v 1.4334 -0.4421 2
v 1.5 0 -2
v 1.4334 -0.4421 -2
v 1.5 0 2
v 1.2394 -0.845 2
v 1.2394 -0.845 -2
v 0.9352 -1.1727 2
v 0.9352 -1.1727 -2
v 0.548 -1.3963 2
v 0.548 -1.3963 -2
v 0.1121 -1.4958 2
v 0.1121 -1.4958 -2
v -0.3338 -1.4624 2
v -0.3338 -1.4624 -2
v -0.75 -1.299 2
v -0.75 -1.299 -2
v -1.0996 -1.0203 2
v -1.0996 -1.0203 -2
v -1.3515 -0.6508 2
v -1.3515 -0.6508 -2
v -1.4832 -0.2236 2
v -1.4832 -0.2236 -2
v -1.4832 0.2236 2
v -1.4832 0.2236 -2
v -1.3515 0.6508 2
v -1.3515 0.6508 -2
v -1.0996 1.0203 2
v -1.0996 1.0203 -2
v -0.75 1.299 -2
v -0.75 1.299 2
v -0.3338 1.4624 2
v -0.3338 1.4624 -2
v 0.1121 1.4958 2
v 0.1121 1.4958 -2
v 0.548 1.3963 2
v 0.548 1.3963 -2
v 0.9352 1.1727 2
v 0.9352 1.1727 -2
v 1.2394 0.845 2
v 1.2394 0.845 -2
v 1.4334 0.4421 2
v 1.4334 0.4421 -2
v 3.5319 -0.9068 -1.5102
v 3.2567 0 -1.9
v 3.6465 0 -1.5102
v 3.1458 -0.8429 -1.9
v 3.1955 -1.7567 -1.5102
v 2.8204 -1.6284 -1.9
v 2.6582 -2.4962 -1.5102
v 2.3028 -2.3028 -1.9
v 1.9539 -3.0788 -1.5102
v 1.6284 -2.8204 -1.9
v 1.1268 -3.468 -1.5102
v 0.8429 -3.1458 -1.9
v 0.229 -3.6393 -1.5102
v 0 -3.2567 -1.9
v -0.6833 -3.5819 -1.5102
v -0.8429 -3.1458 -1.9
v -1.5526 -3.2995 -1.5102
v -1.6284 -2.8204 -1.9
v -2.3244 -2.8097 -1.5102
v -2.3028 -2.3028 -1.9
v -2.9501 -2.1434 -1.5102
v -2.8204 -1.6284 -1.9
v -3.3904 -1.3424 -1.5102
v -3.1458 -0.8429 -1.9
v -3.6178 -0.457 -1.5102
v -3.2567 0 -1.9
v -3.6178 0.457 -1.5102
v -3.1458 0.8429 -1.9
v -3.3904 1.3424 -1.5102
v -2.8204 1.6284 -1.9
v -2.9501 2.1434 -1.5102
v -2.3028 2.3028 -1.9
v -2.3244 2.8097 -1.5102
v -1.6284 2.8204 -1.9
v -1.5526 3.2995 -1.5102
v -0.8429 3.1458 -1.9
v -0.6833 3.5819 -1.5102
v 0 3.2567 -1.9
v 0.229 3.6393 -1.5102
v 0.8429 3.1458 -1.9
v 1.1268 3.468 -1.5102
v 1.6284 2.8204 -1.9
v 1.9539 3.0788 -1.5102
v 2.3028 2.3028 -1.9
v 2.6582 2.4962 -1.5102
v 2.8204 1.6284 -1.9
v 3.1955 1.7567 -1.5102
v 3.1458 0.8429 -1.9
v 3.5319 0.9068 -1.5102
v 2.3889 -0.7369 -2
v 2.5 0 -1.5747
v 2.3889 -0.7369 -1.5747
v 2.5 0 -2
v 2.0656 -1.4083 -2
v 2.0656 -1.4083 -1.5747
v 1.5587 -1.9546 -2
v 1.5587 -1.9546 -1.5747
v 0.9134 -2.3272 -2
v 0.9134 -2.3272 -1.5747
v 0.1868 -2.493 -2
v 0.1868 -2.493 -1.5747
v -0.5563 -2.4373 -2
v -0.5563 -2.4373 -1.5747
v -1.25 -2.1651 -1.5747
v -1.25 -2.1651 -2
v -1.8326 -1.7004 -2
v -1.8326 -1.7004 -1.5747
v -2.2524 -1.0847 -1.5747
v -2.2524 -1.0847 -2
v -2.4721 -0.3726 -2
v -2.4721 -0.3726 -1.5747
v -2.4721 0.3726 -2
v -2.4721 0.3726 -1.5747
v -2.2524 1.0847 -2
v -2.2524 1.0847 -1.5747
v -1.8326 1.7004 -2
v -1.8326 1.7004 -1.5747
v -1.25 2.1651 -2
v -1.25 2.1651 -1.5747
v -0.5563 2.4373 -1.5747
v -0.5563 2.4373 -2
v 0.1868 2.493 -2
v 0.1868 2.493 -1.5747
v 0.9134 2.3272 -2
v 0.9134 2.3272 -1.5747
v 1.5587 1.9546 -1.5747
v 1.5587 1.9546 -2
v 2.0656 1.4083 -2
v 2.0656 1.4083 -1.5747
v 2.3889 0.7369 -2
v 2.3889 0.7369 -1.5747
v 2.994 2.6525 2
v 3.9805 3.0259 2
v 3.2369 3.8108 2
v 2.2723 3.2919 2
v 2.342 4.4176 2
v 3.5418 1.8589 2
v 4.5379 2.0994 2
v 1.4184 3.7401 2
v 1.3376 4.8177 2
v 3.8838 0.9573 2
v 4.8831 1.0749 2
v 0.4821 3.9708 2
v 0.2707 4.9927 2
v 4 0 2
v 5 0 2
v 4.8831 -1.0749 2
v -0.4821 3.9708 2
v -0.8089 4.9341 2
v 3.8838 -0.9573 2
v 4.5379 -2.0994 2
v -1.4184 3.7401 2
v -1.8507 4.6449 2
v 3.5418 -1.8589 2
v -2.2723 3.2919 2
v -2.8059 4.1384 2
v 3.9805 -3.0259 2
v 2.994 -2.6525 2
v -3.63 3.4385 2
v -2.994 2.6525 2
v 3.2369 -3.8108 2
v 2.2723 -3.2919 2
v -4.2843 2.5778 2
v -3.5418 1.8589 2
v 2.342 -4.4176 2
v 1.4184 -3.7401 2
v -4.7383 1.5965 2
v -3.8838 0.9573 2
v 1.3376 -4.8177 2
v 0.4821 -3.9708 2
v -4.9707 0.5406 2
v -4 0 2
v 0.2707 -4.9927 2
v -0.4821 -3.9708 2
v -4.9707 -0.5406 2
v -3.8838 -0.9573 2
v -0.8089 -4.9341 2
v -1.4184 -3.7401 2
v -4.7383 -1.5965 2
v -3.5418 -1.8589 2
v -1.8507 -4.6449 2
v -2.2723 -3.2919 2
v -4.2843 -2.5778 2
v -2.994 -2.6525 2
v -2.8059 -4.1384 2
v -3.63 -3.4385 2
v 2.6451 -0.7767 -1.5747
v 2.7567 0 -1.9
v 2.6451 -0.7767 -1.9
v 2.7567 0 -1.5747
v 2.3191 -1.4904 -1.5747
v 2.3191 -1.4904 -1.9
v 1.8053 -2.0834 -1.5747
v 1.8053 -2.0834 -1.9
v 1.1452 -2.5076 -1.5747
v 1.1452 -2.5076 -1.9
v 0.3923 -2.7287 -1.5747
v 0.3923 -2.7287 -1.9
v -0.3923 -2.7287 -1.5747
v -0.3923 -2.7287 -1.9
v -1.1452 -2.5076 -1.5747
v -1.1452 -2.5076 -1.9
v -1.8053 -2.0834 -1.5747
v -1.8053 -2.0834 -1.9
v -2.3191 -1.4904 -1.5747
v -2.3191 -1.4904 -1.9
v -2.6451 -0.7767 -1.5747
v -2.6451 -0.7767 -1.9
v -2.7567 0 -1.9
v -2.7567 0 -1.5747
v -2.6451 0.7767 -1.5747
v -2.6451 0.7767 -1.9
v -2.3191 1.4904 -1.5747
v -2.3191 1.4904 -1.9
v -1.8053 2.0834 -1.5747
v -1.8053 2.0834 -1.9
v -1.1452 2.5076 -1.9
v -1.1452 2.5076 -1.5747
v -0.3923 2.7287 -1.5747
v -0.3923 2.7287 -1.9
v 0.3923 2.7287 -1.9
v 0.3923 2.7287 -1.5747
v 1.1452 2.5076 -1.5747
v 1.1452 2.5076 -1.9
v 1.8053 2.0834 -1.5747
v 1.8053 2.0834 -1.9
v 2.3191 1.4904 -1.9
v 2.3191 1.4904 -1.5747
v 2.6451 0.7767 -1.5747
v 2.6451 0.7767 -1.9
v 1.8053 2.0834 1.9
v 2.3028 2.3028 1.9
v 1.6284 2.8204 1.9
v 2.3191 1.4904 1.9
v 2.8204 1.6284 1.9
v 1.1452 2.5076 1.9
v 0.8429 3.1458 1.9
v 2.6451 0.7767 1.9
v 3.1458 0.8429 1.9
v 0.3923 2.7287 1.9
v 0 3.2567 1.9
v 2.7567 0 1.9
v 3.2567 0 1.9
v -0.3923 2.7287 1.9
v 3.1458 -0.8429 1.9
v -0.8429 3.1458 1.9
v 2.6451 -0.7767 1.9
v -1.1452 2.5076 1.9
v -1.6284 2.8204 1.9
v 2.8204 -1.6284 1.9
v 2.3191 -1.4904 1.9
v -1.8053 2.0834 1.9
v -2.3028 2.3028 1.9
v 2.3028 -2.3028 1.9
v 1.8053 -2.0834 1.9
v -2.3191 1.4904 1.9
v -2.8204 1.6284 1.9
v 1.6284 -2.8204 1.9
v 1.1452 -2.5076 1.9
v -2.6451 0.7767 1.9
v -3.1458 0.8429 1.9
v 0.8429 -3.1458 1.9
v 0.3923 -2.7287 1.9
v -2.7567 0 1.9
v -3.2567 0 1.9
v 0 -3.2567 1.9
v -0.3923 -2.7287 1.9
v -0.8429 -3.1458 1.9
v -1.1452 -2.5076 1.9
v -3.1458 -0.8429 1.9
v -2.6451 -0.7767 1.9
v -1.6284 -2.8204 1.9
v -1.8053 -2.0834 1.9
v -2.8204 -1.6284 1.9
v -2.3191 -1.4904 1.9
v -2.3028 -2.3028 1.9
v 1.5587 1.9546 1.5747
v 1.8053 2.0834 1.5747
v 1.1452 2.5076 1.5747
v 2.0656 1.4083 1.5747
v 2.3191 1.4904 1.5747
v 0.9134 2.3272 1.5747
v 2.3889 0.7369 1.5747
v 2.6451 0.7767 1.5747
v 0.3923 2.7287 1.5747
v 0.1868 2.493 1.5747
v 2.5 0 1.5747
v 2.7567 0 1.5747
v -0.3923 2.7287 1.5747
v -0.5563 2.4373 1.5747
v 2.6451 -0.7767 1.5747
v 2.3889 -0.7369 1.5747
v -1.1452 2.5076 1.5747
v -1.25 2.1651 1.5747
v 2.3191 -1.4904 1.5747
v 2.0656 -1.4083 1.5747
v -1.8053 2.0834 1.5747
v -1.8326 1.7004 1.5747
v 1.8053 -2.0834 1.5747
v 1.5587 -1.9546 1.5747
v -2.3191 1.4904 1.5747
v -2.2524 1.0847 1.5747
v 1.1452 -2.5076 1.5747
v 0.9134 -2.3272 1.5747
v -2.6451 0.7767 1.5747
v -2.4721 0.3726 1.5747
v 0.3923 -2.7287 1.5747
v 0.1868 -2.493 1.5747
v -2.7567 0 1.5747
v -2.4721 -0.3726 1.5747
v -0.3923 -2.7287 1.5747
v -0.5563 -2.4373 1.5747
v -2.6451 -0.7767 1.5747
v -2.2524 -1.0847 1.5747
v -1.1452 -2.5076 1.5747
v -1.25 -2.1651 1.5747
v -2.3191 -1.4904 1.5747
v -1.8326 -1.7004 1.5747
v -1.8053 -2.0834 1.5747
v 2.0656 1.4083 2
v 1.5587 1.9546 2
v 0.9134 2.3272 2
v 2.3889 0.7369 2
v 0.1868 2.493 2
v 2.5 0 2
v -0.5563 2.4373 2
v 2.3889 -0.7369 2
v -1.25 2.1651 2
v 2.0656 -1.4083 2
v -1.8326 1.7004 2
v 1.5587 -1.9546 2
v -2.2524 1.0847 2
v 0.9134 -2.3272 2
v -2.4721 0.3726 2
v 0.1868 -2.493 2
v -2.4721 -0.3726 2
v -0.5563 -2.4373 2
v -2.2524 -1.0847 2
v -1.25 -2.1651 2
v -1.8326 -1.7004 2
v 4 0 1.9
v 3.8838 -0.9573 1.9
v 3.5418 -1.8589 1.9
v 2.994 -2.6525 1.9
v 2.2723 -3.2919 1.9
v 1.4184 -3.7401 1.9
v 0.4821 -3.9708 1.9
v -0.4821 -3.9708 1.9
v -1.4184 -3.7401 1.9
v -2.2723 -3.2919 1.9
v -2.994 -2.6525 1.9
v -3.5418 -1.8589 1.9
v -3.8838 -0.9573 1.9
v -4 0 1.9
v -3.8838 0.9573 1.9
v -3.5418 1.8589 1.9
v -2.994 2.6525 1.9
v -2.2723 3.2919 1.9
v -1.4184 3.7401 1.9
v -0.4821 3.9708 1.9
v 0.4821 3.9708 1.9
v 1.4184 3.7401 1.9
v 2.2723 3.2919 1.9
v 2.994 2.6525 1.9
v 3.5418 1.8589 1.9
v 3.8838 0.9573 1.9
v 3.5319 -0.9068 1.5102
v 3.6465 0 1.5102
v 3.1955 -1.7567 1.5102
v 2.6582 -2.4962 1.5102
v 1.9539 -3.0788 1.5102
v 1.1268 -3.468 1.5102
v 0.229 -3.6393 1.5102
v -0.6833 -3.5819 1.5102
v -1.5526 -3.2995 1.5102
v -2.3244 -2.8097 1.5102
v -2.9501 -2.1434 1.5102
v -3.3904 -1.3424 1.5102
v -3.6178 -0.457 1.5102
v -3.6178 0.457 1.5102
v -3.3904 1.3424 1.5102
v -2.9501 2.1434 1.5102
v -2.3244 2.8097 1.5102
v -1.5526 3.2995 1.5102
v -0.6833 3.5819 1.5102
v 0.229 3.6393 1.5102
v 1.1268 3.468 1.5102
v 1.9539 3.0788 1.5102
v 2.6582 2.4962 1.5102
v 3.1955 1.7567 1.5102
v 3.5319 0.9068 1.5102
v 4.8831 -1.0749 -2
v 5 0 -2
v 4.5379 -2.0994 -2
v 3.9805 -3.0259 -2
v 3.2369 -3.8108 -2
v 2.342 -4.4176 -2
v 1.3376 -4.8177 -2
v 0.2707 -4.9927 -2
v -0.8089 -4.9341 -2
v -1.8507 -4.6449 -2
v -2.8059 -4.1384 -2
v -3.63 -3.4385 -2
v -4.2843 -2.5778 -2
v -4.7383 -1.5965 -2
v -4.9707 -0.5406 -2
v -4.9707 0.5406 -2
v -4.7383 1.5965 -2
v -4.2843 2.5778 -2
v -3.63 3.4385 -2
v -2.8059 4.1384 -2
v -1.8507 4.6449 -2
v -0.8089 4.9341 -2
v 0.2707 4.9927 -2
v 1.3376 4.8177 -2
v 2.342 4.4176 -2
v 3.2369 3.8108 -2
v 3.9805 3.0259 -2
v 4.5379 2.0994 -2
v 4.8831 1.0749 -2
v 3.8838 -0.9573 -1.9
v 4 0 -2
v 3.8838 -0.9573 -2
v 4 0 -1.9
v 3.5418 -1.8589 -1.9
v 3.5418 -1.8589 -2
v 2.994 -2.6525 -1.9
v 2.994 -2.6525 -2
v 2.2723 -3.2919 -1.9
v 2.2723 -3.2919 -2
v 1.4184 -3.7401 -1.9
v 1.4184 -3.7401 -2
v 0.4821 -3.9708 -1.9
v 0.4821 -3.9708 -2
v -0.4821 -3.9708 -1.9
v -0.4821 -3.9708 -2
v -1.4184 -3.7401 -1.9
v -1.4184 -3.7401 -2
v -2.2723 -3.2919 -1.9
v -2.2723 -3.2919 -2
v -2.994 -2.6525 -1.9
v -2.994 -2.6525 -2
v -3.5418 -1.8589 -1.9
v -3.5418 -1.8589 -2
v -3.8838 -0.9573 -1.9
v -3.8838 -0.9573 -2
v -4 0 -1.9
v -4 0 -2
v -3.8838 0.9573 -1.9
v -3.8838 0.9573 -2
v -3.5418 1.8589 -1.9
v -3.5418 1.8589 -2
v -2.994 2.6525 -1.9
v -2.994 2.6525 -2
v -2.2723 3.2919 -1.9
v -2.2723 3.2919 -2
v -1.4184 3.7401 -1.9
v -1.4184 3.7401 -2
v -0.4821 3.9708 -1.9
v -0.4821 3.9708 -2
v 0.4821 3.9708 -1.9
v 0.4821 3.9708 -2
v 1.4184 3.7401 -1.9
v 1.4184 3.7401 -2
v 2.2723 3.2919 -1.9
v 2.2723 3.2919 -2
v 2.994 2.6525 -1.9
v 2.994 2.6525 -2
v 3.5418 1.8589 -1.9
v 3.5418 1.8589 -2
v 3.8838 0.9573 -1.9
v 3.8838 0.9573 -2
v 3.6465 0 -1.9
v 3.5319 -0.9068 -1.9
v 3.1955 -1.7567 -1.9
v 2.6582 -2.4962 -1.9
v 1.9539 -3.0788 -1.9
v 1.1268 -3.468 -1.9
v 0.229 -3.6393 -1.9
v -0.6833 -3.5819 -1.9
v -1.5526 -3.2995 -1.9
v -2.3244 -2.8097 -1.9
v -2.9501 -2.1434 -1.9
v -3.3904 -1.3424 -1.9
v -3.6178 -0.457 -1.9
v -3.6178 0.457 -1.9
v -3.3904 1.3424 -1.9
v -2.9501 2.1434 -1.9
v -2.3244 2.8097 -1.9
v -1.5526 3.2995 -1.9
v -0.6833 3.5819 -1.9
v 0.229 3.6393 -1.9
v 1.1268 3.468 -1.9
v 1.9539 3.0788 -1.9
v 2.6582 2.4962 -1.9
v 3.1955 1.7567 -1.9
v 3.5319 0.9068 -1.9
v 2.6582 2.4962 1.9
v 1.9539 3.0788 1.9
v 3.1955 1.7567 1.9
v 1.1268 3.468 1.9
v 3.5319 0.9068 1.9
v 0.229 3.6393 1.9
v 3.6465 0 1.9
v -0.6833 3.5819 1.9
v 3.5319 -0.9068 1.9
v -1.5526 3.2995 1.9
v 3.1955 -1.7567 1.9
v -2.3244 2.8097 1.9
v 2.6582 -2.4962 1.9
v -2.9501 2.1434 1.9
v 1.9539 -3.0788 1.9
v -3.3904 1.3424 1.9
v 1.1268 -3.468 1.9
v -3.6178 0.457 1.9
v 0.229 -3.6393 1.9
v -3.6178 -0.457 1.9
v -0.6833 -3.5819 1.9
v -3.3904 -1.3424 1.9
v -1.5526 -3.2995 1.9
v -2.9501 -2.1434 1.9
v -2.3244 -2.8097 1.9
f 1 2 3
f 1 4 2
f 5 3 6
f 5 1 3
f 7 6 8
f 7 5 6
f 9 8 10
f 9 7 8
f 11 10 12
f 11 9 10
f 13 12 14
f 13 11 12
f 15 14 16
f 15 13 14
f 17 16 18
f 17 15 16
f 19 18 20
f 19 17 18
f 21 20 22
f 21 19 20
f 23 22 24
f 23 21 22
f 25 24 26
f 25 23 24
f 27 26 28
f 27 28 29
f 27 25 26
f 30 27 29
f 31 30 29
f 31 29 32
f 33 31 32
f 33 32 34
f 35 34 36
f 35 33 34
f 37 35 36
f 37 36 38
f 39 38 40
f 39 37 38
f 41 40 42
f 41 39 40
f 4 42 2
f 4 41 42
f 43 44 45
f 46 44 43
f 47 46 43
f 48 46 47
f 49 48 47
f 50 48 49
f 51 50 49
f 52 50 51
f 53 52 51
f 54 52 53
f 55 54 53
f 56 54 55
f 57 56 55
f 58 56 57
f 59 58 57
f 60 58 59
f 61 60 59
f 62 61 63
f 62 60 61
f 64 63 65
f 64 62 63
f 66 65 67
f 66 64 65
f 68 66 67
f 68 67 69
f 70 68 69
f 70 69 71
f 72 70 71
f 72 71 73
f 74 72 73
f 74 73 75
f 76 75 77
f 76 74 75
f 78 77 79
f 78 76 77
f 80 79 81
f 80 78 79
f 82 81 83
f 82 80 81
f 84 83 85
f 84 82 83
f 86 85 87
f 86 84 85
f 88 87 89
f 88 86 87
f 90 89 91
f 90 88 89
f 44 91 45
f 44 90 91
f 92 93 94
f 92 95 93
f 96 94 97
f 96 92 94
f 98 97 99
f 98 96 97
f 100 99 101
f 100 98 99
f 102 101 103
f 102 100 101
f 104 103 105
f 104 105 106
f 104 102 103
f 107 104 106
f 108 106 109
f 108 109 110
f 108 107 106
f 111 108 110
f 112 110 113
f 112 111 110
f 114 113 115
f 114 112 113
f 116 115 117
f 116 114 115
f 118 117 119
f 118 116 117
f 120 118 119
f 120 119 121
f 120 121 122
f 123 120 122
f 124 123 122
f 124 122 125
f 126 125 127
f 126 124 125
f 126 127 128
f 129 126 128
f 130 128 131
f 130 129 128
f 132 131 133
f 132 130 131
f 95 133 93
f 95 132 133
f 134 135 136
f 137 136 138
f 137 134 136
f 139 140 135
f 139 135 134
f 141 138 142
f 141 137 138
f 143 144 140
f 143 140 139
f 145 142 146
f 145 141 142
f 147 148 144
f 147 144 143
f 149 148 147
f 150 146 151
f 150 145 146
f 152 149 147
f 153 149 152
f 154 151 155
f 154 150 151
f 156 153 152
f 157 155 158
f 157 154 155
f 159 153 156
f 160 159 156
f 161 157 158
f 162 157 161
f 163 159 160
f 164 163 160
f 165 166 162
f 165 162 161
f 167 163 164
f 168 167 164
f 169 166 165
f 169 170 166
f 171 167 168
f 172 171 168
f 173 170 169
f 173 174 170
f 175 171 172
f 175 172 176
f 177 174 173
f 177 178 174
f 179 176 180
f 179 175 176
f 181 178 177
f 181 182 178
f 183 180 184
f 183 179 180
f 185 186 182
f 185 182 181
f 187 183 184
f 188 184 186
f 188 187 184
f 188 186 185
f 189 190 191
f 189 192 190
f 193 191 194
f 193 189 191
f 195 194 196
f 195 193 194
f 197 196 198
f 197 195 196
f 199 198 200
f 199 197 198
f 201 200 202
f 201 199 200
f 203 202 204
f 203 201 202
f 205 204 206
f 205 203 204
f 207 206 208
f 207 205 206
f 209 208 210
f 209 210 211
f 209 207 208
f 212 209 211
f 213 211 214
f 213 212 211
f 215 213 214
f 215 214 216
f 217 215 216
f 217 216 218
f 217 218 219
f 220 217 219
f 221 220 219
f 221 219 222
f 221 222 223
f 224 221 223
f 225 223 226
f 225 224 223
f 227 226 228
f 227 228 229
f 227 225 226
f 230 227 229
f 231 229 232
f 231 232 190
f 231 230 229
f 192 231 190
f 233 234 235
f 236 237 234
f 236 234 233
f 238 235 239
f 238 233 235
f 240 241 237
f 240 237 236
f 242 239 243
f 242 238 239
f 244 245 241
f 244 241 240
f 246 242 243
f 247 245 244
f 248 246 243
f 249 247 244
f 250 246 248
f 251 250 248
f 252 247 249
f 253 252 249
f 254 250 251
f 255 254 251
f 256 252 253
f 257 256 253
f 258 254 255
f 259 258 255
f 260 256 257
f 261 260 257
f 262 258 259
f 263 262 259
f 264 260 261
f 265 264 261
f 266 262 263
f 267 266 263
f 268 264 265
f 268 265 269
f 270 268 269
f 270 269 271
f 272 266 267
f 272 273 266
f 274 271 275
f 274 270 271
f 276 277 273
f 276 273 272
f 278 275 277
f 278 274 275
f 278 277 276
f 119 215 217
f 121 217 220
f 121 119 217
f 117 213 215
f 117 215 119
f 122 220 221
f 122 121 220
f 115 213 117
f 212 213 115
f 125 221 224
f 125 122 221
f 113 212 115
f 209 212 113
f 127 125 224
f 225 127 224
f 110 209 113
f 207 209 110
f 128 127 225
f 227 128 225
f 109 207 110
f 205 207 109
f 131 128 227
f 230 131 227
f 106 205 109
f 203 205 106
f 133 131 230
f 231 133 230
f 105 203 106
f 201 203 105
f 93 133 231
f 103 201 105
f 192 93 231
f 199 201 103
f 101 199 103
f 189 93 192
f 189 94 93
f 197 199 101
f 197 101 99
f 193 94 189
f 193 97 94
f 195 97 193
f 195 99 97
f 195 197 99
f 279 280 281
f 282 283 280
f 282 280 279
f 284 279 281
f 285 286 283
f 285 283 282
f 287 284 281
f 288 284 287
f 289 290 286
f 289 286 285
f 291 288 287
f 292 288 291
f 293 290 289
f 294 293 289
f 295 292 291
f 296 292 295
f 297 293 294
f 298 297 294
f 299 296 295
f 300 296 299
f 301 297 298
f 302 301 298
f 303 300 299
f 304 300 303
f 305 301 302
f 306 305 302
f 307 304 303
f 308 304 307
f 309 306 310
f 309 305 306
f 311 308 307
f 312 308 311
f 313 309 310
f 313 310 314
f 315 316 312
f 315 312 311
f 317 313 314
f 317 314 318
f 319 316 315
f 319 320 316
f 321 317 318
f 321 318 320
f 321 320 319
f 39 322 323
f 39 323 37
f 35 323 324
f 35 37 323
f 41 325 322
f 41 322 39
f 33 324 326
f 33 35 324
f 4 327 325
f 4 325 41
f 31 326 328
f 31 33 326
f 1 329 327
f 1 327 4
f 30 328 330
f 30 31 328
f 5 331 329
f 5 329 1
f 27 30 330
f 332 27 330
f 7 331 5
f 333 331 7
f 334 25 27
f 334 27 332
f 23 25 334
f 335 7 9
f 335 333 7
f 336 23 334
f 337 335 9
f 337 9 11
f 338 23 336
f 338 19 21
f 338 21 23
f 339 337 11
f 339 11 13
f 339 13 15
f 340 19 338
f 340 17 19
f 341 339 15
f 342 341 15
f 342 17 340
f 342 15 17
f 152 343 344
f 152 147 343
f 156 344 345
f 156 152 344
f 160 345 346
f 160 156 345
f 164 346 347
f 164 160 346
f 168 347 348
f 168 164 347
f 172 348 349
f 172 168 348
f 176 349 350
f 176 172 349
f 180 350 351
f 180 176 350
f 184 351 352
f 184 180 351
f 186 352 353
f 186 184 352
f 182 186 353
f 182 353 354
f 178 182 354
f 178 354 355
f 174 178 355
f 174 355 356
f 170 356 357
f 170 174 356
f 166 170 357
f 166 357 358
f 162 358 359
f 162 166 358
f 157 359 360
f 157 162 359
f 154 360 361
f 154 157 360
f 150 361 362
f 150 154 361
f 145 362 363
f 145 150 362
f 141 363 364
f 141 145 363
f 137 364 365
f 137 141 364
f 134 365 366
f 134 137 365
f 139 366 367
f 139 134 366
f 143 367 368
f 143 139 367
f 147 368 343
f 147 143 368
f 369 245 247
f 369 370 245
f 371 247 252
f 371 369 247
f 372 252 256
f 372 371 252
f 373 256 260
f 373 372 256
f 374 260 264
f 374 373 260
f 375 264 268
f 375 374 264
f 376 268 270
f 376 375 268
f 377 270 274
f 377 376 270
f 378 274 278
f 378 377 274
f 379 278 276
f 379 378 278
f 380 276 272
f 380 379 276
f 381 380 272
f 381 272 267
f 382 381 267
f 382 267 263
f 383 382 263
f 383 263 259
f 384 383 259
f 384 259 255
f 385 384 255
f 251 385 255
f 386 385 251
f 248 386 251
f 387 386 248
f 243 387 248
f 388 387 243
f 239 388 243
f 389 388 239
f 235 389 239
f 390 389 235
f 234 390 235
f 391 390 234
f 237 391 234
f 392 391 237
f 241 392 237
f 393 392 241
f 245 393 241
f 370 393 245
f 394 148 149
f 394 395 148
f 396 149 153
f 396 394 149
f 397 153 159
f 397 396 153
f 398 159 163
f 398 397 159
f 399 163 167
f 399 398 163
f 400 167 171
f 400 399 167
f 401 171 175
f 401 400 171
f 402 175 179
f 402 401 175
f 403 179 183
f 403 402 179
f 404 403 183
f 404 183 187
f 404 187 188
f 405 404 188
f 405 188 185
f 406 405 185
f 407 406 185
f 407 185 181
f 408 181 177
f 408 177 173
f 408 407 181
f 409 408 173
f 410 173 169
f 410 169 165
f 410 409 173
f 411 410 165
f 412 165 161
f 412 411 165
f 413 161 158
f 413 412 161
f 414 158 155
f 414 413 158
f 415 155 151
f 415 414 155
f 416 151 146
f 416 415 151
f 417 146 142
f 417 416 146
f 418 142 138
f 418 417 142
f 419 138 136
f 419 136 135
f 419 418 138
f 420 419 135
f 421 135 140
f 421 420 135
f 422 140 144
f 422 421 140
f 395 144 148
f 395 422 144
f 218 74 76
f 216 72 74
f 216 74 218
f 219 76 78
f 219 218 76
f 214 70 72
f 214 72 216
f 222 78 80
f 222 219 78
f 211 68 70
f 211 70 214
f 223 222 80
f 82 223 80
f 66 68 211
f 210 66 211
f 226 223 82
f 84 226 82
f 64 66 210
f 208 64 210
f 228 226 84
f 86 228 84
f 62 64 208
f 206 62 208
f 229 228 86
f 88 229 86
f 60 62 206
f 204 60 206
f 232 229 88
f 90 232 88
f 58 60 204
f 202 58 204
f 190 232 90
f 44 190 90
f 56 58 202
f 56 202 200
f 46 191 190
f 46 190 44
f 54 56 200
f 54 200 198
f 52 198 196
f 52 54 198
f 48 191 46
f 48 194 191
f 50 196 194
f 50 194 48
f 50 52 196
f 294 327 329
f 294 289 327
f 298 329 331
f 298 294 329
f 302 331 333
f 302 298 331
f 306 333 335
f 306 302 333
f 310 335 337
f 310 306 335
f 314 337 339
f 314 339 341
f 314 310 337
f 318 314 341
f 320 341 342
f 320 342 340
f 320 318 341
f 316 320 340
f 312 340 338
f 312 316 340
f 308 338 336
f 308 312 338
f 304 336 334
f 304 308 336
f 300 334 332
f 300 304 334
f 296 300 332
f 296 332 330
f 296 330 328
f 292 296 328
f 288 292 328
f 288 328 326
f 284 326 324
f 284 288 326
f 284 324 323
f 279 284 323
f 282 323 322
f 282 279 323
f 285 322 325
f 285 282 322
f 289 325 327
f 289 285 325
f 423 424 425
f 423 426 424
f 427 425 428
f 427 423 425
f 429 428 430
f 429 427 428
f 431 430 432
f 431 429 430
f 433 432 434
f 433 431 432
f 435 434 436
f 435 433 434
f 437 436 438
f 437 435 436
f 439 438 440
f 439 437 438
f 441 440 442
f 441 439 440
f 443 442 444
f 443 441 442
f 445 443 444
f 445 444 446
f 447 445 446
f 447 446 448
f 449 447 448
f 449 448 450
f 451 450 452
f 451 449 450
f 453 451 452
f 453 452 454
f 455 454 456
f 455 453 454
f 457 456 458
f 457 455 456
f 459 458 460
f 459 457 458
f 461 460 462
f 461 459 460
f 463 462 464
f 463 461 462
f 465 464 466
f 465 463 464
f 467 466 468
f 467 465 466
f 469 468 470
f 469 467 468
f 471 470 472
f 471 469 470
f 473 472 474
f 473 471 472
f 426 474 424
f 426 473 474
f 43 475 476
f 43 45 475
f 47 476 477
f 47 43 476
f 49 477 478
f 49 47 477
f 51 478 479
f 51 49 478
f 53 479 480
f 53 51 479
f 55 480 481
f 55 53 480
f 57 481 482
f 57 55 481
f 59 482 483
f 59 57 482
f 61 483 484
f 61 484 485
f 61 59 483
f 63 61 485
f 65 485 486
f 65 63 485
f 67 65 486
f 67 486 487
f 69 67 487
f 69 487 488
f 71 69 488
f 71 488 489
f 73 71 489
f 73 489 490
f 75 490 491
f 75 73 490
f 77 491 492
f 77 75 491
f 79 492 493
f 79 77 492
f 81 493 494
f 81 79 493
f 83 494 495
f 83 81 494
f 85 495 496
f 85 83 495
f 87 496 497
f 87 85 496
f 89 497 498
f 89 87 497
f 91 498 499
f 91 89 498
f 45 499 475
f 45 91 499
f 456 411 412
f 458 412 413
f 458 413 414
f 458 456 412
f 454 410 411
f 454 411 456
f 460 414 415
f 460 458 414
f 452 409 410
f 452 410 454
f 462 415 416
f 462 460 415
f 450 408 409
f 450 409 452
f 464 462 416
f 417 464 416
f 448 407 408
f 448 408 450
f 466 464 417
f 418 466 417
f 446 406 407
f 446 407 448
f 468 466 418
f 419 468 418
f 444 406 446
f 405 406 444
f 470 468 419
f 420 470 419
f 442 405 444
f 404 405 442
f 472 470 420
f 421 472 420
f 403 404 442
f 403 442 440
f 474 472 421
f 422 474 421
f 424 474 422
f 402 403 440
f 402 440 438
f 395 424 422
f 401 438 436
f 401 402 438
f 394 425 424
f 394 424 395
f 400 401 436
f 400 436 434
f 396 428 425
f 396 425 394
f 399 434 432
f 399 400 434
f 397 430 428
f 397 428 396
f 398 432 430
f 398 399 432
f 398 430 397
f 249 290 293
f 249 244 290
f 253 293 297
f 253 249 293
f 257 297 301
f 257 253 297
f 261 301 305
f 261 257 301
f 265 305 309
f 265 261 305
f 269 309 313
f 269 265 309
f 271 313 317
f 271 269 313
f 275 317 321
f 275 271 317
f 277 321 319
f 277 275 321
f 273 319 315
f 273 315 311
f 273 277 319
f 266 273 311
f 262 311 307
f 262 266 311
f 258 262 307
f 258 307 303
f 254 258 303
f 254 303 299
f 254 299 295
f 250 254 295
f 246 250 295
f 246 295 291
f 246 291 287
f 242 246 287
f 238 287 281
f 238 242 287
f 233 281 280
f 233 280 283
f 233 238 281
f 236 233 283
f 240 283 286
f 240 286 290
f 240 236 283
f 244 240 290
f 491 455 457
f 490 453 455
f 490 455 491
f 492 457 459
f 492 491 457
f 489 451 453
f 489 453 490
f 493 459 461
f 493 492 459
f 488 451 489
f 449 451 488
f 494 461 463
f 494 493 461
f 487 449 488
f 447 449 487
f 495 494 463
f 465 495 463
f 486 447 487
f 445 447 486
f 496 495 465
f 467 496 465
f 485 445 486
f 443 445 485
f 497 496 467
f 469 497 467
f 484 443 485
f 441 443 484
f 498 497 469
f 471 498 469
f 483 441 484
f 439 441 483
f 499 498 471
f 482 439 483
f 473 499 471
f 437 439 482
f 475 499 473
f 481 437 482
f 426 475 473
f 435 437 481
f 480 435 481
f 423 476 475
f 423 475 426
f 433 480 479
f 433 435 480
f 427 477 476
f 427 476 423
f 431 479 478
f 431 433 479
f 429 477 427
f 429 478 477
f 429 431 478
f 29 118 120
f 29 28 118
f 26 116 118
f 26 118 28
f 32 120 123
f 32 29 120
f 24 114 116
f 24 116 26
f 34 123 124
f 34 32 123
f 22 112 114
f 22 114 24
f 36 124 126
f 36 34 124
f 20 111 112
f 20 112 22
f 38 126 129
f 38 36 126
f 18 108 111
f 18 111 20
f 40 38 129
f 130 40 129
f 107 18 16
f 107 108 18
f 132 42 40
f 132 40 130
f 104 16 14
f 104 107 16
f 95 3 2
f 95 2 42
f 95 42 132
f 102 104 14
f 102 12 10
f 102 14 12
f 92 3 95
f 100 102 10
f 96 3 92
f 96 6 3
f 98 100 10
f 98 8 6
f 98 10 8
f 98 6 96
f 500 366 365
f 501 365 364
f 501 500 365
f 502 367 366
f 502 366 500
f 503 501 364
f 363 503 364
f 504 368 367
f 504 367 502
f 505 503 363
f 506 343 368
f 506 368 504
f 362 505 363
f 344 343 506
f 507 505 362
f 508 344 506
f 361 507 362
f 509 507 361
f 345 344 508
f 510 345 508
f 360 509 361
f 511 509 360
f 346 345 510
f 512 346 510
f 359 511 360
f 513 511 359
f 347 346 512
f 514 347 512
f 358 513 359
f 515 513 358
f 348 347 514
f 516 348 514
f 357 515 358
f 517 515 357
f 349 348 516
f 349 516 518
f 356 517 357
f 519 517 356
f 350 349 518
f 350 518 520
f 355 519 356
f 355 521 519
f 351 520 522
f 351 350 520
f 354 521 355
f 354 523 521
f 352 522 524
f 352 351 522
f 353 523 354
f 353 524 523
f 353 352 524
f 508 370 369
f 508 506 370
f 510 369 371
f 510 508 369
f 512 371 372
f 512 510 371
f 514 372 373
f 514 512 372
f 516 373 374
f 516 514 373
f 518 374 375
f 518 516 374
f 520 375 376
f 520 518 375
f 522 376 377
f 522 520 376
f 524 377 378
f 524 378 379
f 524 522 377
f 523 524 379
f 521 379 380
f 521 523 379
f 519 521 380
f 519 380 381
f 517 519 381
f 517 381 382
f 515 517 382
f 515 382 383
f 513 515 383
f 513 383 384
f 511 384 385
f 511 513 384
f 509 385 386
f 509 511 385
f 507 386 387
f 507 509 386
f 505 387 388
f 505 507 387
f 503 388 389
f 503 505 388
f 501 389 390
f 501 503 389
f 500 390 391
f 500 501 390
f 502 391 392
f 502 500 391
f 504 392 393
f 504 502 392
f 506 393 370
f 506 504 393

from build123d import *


with BuildPart() as part:
    # Esquisse2 → Révolution1 (revolve)
    with BuildSketch(Plane(origin=(0, 0, 0), x_dir=(0, 0, -1), z_dir=(1, 0, 0)), mode=Mode.PRIVATE) as r_volution1_sk:
        Polygon((2, 1.5), (-2, 1.5), (-2, 2.5), (-1.574731183, 2.5), (-1.574731183, 2.75672043), (-1.9, 2.75672043), (-1.9, 3.25672043), (-1.510215054, 3.646505376), (-1.9, 3.646505376), (-1.9, 4), (-2, 4), (-2, 5), (2, 5), (2, 4), (1.9, 4), (1.9, 3.646505376), (1.510215054, 3.646505376), (1.9, 3.25672043), (1.9, 2.75672043), (1.574731183, 2.75672043), (1.574731183, 2.5), (2, 2.5), align=None)
    revolve(r_volution1_sk.sketch.rotate(Axis((0, 0, 4.422043011), (0, 0, -1)), 90), axis=Axis((0, 0, 4.422043011), (0, 0, -1)))


solid = part.part
